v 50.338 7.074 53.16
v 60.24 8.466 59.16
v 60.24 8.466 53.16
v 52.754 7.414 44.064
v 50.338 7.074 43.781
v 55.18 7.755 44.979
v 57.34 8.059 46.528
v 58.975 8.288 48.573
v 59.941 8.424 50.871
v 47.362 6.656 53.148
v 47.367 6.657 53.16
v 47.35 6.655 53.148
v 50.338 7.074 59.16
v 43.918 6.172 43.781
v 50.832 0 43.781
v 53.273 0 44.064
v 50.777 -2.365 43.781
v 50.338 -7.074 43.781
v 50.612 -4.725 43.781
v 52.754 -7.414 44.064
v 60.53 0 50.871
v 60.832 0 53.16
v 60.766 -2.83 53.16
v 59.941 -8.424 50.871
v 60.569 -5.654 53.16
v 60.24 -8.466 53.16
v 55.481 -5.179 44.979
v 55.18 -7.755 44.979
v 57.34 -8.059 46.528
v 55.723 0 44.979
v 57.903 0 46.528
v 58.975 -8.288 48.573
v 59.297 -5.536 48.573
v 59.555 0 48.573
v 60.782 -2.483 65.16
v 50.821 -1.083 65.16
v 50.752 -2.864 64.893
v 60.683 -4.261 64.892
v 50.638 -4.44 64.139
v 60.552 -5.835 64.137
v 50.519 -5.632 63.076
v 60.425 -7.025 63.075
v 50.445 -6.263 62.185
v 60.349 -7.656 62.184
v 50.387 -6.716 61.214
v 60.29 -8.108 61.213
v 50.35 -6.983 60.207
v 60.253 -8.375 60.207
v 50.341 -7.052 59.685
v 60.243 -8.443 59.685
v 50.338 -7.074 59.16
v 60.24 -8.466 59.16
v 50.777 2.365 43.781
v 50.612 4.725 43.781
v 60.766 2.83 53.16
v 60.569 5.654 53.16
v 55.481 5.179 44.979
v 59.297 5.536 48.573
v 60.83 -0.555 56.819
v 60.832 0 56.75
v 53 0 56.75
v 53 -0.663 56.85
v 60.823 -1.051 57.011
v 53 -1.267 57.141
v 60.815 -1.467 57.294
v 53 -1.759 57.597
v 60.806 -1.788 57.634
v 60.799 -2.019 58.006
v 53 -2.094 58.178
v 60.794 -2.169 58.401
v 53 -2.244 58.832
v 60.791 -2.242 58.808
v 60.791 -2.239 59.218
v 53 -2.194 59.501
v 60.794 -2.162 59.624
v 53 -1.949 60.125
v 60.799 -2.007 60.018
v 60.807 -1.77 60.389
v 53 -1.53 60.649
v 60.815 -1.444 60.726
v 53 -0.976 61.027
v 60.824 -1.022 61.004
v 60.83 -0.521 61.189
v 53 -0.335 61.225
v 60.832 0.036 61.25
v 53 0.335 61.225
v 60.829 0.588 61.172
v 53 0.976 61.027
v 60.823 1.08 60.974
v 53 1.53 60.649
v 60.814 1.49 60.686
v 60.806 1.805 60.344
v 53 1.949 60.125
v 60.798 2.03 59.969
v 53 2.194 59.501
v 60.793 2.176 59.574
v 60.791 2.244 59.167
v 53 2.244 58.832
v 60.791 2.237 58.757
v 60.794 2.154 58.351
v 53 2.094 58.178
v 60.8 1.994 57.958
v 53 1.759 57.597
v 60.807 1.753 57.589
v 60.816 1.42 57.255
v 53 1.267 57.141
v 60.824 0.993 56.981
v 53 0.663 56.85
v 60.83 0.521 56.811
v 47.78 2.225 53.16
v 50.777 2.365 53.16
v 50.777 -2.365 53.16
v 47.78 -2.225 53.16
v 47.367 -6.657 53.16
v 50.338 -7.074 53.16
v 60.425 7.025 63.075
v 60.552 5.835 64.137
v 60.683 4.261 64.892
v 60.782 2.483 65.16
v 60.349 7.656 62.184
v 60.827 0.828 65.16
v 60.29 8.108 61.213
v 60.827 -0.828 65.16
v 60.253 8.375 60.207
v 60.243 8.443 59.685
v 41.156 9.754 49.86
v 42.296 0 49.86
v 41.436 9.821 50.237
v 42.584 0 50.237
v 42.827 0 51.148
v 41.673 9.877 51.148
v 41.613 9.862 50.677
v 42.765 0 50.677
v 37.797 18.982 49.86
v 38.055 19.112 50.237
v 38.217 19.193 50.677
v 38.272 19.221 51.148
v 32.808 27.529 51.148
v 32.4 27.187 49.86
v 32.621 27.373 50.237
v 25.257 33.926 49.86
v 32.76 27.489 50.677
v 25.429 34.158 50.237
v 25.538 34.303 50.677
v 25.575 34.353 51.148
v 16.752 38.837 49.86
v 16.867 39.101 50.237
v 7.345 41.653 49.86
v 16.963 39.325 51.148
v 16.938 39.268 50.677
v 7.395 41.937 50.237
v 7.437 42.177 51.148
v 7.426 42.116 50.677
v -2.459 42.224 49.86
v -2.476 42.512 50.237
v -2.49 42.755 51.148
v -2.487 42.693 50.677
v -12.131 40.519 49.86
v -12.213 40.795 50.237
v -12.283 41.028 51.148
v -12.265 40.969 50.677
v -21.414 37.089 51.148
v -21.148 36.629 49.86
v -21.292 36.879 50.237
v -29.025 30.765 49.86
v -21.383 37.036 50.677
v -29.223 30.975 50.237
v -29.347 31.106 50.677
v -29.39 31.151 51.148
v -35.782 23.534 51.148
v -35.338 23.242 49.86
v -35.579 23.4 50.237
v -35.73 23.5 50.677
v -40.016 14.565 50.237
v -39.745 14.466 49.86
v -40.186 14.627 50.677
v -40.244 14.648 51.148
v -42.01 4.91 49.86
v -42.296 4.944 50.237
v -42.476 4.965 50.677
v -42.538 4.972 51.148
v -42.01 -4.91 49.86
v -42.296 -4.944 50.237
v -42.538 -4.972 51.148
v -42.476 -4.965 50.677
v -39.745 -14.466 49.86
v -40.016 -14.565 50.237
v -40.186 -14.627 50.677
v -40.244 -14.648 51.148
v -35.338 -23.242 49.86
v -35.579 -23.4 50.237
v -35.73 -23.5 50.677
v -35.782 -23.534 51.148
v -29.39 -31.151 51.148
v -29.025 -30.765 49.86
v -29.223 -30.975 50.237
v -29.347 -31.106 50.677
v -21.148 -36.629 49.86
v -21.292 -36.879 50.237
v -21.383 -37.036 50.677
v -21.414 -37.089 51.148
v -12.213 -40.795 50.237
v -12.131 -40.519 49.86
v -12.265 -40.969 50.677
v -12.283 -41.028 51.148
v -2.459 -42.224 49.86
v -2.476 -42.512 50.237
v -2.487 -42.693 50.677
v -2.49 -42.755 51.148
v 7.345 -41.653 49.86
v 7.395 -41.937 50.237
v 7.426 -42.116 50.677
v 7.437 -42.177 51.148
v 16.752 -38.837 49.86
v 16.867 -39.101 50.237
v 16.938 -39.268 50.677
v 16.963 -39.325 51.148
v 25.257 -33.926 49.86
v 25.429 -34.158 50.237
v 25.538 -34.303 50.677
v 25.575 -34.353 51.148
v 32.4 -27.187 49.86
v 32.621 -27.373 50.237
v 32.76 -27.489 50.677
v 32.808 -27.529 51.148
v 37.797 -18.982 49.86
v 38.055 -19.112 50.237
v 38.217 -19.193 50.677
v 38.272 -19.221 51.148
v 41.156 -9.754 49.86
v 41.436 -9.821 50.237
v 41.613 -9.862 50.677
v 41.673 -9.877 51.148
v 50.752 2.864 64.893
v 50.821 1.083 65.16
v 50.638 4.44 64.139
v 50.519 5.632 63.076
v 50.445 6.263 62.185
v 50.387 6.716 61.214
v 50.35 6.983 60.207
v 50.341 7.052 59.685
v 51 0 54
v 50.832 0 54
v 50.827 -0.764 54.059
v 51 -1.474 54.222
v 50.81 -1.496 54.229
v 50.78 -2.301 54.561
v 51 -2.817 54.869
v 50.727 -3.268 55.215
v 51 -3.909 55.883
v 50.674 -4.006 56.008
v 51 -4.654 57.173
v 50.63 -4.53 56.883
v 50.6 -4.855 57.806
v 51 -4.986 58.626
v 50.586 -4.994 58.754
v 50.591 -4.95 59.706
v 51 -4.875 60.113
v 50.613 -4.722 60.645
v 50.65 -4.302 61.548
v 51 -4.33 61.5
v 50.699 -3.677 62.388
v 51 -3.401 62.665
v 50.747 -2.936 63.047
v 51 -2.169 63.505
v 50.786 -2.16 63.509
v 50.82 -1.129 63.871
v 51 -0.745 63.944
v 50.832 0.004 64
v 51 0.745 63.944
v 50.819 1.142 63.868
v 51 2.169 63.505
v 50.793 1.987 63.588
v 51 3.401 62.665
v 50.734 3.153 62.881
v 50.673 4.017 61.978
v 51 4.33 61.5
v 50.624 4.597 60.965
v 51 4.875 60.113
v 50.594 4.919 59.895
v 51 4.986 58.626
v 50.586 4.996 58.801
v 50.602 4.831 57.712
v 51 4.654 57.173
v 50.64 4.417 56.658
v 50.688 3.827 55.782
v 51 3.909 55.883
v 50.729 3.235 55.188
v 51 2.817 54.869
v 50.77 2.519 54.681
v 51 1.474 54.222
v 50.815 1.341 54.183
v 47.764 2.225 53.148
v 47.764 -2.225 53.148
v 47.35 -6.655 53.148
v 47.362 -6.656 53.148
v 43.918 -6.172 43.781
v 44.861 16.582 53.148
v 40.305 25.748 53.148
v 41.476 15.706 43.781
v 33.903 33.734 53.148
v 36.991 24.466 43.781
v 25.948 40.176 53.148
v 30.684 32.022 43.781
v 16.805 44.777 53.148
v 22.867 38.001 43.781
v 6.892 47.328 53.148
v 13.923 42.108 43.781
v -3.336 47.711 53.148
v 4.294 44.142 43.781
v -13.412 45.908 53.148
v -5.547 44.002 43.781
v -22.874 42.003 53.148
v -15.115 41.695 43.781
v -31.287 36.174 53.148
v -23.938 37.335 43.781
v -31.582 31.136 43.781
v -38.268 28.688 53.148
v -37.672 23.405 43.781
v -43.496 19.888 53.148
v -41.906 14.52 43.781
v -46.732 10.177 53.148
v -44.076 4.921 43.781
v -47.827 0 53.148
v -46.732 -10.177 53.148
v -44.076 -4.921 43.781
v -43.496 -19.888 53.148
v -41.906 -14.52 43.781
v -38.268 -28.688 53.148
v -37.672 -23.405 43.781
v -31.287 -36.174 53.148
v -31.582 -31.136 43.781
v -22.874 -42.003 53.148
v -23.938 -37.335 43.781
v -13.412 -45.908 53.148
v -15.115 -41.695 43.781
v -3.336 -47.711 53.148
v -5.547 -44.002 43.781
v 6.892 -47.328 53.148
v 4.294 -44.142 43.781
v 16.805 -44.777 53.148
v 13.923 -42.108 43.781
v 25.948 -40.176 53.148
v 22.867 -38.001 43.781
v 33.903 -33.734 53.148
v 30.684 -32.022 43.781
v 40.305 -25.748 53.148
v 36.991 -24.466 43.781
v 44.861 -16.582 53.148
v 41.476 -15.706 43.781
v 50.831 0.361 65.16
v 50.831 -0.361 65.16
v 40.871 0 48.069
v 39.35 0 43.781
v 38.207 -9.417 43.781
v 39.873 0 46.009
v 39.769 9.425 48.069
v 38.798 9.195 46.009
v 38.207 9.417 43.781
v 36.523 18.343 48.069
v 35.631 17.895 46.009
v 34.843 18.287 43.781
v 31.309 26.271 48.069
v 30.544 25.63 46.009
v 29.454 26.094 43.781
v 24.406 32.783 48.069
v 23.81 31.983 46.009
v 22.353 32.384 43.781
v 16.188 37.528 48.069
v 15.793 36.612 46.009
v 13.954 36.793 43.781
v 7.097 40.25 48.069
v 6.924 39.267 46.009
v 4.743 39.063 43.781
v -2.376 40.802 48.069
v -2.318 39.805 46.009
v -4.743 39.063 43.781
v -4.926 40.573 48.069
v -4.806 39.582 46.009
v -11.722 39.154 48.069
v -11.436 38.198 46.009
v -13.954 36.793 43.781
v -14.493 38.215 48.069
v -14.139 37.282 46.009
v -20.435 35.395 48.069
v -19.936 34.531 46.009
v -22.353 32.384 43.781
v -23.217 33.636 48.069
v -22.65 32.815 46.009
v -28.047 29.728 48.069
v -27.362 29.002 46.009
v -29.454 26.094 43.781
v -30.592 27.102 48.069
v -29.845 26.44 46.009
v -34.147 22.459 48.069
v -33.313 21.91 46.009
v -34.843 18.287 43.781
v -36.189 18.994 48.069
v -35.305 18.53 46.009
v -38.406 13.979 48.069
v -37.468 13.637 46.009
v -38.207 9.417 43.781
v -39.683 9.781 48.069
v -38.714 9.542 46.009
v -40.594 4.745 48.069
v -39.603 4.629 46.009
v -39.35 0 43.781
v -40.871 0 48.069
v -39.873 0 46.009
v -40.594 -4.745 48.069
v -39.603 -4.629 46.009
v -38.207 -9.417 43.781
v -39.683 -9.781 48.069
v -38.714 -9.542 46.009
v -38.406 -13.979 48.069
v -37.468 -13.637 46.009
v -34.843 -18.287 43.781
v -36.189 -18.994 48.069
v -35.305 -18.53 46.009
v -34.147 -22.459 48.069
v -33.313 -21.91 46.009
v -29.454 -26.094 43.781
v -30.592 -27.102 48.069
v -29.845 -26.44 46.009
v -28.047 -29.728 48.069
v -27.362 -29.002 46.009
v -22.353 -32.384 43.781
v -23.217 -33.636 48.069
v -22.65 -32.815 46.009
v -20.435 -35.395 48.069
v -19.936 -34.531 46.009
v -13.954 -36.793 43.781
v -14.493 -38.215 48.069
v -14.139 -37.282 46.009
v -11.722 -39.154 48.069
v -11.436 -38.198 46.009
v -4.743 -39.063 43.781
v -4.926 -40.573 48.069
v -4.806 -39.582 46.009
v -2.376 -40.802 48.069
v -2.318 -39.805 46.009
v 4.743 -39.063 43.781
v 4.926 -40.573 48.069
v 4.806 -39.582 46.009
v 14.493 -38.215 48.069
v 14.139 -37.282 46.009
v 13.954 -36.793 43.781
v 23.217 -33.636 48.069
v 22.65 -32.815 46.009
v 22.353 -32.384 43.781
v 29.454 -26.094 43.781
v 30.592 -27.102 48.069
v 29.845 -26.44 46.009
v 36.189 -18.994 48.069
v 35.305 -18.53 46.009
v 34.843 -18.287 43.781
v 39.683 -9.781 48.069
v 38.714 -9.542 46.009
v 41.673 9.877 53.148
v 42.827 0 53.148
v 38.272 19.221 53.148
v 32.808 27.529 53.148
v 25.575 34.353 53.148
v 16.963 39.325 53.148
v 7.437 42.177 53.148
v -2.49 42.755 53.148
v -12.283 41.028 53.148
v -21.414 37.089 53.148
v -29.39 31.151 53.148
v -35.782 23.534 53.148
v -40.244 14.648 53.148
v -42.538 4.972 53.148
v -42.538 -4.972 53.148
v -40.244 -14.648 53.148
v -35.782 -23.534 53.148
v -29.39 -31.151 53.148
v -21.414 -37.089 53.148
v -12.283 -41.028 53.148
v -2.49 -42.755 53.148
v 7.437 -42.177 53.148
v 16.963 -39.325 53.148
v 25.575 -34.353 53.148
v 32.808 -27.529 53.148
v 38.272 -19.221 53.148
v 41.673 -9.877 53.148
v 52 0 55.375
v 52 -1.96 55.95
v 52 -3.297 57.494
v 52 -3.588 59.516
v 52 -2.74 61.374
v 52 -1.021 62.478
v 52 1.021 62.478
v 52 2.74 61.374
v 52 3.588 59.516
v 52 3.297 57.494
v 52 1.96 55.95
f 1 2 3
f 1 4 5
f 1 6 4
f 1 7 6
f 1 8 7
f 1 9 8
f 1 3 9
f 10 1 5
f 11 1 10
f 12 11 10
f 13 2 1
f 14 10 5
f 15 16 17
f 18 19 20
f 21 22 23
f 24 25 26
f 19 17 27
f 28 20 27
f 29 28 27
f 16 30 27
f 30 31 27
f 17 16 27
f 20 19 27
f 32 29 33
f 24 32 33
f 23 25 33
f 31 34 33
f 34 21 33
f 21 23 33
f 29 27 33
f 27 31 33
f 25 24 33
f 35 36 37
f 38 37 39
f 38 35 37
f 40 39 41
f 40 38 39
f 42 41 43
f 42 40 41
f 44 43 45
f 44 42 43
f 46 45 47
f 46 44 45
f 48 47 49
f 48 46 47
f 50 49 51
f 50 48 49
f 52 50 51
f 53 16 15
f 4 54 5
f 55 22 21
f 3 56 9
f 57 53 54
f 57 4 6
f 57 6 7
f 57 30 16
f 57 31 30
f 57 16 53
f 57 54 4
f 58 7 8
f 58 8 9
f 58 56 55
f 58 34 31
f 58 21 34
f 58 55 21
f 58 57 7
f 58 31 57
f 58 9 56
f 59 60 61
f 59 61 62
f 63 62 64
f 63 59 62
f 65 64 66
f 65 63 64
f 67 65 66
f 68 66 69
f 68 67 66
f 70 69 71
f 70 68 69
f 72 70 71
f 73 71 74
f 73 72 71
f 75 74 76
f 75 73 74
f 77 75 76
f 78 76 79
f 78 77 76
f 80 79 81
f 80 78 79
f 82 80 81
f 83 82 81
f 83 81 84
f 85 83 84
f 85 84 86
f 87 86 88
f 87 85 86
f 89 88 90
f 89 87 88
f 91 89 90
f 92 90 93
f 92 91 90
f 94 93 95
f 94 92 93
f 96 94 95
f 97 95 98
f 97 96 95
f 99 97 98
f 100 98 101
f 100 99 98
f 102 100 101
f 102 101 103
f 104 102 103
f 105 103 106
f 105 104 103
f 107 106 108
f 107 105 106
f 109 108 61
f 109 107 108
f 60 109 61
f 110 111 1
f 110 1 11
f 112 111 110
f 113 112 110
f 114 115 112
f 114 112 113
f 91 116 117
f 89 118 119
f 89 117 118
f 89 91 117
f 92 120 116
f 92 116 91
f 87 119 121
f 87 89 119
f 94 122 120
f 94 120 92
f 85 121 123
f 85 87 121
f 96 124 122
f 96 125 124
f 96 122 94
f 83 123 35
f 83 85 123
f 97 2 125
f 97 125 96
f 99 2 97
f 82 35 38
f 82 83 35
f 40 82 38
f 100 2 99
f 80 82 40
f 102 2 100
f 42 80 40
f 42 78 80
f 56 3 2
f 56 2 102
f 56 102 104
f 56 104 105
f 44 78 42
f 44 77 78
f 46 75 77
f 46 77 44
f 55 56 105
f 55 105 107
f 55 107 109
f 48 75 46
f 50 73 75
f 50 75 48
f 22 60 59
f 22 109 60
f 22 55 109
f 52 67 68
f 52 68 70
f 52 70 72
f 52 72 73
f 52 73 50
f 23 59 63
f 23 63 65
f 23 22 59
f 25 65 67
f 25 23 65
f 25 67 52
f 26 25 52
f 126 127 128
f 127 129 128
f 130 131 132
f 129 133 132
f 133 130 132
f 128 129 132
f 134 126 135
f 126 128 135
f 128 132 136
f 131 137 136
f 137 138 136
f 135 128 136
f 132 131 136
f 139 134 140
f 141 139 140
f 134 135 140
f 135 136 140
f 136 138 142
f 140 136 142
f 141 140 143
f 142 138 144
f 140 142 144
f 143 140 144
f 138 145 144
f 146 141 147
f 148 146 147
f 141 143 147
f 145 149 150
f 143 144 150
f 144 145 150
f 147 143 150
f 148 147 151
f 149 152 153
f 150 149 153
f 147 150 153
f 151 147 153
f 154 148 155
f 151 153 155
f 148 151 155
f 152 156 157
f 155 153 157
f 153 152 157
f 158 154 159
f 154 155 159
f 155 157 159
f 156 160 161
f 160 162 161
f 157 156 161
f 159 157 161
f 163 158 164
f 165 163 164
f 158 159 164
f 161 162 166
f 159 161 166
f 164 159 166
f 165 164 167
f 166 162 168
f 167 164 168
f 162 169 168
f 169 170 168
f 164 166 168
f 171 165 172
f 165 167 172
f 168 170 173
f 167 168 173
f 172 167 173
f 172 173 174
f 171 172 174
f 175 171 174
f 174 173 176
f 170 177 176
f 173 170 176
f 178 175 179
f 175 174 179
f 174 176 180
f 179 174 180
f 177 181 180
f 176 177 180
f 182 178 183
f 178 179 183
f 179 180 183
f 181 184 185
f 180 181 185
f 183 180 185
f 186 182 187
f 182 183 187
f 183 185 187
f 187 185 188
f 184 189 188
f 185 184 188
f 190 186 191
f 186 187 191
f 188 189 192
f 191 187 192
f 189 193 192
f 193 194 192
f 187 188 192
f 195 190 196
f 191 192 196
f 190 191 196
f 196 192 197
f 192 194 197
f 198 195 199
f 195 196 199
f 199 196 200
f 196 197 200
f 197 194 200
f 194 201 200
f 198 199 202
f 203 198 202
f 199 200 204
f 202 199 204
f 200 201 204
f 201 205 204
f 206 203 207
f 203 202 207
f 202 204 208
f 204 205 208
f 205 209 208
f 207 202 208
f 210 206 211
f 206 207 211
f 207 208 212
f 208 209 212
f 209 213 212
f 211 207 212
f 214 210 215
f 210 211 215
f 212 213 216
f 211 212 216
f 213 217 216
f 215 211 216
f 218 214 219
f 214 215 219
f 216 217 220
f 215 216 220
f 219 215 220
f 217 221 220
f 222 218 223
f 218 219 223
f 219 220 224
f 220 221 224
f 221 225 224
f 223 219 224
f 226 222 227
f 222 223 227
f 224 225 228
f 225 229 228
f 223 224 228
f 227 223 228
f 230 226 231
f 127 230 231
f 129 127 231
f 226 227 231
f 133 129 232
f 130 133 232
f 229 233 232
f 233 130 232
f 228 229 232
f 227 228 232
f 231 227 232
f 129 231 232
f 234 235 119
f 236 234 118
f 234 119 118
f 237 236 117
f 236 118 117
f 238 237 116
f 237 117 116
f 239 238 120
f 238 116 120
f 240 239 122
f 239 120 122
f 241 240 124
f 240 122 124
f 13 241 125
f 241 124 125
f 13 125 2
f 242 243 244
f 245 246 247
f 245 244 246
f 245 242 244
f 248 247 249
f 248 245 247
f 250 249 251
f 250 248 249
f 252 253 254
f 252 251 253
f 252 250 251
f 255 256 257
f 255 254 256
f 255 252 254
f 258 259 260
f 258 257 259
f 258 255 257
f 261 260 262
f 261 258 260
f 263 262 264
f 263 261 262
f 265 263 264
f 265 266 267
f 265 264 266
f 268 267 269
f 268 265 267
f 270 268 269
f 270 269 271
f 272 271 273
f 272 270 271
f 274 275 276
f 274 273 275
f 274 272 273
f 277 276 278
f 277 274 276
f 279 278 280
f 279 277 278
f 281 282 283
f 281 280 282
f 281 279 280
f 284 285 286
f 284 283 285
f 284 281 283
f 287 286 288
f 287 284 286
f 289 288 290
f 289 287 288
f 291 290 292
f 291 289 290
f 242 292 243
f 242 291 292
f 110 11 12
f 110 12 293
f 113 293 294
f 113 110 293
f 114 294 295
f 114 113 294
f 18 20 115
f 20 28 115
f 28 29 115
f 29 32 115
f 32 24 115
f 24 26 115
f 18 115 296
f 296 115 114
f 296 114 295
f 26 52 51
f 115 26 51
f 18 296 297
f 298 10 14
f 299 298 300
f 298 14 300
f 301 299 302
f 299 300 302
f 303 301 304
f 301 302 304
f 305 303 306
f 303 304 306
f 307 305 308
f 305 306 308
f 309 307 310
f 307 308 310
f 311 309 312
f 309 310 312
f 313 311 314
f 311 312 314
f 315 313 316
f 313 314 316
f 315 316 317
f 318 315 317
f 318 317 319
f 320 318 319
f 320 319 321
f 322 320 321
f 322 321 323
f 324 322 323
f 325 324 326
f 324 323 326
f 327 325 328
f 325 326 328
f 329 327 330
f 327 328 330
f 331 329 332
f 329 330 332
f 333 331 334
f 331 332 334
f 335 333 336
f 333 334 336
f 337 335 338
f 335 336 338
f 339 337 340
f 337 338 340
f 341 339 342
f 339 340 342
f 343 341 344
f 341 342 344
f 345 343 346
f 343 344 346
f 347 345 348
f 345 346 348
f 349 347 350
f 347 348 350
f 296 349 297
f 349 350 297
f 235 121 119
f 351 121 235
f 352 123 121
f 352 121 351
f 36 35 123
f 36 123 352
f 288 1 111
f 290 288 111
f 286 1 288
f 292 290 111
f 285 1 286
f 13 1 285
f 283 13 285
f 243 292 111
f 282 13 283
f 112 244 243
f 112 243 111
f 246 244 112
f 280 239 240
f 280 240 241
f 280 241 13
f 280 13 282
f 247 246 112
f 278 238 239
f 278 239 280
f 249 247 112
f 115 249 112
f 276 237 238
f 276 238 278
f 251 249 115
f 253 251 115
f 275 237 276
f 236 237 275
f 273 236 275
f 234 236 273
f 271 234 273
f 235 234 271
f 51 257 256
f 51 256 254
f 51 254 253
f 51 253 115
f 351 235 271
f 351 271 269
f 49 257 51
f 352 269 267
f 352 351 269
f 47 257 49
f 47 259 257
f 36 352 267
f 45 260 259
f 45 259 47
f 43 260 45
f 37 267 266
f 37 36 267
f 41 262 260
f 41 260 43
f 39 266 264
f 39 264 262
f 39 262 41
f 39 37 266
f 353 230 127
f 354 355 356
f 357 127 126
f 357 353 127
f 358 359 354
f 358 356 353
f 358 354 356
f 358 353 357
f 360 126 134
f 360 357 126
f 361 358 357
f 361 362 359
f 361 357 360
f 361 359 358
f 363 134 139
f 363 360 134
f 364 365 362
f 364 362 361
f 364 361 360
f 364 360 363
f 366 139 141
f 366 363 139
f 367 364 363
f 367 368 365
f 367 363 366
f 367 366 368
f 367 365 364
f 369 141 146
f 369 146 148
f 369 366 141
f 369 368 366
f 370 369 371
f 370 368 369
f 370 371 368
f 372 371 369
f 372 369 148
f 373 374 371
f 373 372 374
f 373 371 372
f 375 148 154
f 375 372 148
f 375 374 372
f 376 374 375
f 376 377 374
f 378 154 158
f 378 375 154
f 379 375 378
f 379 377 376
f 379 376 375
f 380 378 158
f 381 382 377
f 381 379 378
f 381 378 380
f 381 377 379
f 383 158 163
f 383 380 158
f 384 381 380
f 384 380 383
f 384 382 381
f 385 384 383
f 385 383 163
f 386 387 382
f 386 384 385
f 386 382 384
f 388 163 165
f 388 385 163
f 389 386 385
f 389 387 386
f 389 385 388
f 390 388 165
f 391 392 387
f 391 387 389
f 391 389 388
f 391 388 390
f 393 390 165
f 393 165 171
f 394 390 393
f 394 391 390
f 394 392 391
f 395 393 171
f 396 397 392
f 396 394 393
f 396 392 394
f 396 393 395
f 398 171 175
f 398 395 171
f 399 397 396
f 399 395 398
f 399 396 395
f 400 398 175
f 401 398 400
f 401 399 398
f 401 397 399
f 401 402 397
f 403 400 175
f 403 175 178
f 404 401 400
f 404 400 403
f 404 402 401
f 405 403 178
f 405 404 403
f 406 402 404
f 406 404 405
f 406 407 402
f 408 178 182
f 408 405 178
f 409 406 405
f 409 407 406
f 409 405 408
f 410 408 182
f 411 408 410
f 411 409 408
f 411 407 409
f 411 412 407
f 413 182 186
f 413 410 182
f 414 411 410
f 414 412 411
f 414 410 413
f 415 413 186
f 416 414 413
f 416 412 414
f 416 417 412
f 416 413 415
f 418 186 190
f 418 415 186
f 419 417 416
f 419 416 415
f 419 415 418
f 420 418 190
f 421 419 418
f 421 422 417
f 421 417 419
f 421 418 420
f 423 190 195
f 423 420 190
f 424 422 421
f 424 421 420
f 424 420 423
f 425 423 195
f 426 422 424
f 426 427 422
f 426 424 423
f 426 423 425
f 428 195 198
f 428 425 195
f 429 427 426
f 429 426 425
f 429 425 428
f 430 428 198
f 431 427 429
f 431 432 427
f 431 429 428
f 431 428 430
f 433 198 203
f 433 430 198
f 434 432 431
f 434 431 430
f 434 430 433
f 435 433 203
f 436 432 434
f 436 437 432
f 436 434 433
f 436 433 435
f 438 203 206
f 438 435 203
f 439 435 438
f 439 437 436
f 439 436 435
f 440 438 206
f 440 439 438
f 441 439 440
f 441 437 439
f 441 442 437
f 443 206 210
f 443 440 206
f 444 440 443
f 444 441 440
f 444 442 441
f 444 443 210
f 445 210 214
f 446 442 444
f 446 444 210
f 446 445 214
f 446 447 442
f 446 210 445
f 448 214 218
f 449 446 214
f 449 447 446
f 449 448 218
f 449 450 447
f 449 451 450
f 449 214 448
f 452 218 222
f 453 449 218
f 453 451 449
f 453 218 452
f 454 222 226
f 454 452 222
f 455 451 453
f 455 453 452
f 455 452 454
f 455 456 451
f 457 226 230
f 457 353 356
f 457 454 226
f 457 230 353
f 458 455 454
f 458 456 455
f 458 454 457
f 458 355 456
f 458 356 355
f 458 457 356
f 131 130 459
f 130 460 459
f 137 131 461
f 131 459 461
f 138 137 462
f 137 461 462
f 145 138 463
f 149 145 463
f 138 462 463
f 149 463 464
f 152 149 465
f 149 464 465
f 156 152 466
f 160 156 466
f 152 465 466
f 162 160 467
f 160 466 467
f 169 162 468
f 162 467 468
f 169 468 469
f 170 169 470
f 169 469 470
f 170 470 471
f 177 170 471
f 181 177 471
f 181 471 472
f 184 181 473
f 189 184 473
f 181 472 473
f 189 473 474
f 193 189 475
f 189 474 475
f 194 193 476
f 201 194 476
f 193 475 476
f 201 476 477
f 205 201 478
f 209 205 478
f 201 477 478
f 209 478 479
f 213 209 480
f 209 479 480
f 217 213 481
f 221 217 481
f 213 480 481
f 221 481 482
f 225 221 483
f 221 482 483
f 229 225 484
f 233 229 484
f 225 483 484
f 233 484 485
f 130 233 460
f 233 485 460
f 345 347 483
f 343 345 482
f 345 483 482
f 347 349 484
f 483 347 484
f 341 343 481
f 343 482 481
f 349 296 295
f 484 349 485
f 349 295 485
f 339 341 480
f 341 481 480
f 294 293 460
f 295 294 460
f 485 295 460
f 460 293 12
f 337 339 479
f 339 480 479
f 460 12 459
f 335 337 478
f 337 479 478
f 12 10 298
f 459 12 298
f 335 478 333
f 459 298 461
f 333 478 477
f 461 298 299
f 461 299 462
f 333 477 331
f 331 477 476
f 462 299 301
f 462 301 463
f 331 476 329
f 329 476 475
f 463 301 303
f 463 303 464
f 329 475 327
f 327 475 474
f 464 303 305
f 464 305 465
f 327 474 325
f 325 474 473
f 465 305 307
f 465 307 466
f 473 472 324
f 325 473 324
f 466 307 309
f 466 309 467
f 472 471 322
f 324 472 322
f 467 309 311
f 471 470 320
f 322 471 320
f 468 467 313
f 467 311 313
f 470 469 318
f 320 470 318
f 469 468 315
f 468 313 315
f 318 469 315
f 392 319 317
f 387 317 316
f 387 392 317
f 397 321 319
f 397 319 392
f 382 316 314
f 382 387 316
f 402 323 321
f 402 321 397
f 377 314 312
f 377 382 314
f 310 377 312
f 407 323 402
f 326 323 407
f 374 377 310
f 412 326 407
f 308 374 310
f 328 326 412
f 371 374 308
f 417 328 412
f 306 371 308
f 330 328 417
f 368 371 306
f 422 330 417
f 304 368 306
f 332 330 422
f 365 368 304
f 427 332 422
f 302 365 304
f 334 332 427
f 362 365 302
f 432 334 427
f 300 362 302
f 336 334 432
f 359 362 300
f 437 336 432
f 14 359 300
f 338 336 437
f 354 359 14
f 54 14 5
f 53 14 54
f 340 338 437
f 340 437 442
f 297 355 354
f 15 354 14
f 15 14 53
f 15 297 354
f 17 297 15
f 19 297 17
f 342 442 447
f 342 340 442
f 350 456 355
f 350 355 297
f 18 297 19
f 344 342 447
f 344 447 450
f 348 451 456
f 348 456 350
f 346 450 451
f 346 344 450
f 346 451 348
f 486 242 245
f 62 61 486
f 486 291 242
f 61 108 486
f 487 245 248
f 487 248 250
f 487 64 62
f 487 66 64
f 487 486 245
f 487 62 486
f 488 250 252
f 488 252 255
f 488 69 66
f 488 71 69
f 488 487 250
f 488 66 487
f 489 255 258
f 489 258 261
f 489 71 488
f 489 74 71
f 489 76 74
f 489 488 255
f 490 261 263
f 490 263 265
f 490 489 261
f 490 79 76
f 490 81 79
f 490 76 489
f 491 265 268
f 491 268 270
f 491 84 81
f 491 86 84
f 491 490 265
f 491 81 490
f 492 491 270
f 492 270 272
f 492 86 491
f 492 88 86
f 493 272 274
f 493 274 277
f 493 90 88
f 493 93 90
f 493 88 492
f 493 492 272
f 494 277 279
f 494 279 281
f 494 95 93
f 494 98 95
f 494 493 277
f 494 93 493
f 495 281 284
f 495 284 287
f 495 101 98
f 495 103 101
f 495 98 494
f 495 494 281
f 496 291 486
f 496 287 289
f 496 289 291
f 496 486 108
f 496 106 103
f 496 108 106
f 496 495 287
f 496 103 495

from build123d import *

# Parameters (mm, degrees)
REVOLUTION001_ANGLE = 16
FILLET_R            = 6


with BuildPart() as part:
    # Sketch → Revolution (revolve)
    with BuildSketch(Plane.XZ):
        with BuildLine():
            ThreePointArc((42.295694, 49.859657), (40.314757, 47.066424), (39.35, 43.780773))
            Line((44.35, 43.780773), (39.35, 43.780773))
            Line((47.827156, 53.147992), (44.35, 43.780773))
            Line((42.827156, 53.147992), (47.827156, 53.147992))
            Line((42.827156, 51.147992), (42.827156, 53.147992))
            ThreePointArc((42.295694, 49.859657), (42.689073, 50.451167), (42.827156, 51.147992))
        make_face()
    revolve(axis=Axis((0, 0, 0), (0, 0, 1)))

    # Sketch004 → Revolution001 (revolve, symmetric)
    with BuildSketch(Plane.XZ) as revolution001_sk:
        with BuildLine():
            Line((44.35, 43.780773), (44.072018, 50.32))
            Line((44.072018, 50.32), (47.83229, 53.160461))
            Line((47.83229, 53.160461), (50.83229, 53.160461))
            Line((50.83229, 53.160461), (50.83229, 65.160461))
            Line((50.83229, 65.160461), (60.83229, 65.160461))
            Line((60.83229, 65.160461), (60.83229, 53.160461))
            add(Edge.make_bspline(
                [(50.83229, 43.780773), (60.83229, 43.780773), (60.83229, 53.160461)],
                knots=[4.712389, 4.712389, 4.712389, 6.283185, 6.283185, 6.283185], degree=2, weights=[1, 0.707107, 1]))
            Line((50.83229, 43.780773), (44.35, 43.780773))
        make_face()
    revolve(axis=Axis((0, 0, 0), (0, 0, 1)), revolution_arc=REVOLUTION001_ANGLE / 2)
    revolve(revolution001_sk.sketch, axis=Axis((0, 0, 0), (0, 0, -1)), revolution_arc=REVOLUTION001_ANGLE / 2)

    # Sketch003 → Groove (revolve, cut)
    with BuildSketch(Plane(origin=(51, 0, 59), x_dir=(-1, 0, 0), z_dir=(0, -1, 0))):
        Polygon((0, 5), (-2, 2.25), (-42.222773, 2.25), (-42.222773, 0), (36.192486, 0), (36.192486, 5), align=None)
    revolve(axis=Axis((51, 0, 59), (-1, 0, 0)), mode=Mode.SUBTRACT)

    # Fillet
    fillet_edges = [part.edges().sort_by_distance(p)[0] for p in [
        (55.288934, -7.770353, 65.160461),
        (55.288934, 7.770353, 65.160461),
    ]]
    fillet(fillet_edges, radius=FILLET_R)


solid = part.part
